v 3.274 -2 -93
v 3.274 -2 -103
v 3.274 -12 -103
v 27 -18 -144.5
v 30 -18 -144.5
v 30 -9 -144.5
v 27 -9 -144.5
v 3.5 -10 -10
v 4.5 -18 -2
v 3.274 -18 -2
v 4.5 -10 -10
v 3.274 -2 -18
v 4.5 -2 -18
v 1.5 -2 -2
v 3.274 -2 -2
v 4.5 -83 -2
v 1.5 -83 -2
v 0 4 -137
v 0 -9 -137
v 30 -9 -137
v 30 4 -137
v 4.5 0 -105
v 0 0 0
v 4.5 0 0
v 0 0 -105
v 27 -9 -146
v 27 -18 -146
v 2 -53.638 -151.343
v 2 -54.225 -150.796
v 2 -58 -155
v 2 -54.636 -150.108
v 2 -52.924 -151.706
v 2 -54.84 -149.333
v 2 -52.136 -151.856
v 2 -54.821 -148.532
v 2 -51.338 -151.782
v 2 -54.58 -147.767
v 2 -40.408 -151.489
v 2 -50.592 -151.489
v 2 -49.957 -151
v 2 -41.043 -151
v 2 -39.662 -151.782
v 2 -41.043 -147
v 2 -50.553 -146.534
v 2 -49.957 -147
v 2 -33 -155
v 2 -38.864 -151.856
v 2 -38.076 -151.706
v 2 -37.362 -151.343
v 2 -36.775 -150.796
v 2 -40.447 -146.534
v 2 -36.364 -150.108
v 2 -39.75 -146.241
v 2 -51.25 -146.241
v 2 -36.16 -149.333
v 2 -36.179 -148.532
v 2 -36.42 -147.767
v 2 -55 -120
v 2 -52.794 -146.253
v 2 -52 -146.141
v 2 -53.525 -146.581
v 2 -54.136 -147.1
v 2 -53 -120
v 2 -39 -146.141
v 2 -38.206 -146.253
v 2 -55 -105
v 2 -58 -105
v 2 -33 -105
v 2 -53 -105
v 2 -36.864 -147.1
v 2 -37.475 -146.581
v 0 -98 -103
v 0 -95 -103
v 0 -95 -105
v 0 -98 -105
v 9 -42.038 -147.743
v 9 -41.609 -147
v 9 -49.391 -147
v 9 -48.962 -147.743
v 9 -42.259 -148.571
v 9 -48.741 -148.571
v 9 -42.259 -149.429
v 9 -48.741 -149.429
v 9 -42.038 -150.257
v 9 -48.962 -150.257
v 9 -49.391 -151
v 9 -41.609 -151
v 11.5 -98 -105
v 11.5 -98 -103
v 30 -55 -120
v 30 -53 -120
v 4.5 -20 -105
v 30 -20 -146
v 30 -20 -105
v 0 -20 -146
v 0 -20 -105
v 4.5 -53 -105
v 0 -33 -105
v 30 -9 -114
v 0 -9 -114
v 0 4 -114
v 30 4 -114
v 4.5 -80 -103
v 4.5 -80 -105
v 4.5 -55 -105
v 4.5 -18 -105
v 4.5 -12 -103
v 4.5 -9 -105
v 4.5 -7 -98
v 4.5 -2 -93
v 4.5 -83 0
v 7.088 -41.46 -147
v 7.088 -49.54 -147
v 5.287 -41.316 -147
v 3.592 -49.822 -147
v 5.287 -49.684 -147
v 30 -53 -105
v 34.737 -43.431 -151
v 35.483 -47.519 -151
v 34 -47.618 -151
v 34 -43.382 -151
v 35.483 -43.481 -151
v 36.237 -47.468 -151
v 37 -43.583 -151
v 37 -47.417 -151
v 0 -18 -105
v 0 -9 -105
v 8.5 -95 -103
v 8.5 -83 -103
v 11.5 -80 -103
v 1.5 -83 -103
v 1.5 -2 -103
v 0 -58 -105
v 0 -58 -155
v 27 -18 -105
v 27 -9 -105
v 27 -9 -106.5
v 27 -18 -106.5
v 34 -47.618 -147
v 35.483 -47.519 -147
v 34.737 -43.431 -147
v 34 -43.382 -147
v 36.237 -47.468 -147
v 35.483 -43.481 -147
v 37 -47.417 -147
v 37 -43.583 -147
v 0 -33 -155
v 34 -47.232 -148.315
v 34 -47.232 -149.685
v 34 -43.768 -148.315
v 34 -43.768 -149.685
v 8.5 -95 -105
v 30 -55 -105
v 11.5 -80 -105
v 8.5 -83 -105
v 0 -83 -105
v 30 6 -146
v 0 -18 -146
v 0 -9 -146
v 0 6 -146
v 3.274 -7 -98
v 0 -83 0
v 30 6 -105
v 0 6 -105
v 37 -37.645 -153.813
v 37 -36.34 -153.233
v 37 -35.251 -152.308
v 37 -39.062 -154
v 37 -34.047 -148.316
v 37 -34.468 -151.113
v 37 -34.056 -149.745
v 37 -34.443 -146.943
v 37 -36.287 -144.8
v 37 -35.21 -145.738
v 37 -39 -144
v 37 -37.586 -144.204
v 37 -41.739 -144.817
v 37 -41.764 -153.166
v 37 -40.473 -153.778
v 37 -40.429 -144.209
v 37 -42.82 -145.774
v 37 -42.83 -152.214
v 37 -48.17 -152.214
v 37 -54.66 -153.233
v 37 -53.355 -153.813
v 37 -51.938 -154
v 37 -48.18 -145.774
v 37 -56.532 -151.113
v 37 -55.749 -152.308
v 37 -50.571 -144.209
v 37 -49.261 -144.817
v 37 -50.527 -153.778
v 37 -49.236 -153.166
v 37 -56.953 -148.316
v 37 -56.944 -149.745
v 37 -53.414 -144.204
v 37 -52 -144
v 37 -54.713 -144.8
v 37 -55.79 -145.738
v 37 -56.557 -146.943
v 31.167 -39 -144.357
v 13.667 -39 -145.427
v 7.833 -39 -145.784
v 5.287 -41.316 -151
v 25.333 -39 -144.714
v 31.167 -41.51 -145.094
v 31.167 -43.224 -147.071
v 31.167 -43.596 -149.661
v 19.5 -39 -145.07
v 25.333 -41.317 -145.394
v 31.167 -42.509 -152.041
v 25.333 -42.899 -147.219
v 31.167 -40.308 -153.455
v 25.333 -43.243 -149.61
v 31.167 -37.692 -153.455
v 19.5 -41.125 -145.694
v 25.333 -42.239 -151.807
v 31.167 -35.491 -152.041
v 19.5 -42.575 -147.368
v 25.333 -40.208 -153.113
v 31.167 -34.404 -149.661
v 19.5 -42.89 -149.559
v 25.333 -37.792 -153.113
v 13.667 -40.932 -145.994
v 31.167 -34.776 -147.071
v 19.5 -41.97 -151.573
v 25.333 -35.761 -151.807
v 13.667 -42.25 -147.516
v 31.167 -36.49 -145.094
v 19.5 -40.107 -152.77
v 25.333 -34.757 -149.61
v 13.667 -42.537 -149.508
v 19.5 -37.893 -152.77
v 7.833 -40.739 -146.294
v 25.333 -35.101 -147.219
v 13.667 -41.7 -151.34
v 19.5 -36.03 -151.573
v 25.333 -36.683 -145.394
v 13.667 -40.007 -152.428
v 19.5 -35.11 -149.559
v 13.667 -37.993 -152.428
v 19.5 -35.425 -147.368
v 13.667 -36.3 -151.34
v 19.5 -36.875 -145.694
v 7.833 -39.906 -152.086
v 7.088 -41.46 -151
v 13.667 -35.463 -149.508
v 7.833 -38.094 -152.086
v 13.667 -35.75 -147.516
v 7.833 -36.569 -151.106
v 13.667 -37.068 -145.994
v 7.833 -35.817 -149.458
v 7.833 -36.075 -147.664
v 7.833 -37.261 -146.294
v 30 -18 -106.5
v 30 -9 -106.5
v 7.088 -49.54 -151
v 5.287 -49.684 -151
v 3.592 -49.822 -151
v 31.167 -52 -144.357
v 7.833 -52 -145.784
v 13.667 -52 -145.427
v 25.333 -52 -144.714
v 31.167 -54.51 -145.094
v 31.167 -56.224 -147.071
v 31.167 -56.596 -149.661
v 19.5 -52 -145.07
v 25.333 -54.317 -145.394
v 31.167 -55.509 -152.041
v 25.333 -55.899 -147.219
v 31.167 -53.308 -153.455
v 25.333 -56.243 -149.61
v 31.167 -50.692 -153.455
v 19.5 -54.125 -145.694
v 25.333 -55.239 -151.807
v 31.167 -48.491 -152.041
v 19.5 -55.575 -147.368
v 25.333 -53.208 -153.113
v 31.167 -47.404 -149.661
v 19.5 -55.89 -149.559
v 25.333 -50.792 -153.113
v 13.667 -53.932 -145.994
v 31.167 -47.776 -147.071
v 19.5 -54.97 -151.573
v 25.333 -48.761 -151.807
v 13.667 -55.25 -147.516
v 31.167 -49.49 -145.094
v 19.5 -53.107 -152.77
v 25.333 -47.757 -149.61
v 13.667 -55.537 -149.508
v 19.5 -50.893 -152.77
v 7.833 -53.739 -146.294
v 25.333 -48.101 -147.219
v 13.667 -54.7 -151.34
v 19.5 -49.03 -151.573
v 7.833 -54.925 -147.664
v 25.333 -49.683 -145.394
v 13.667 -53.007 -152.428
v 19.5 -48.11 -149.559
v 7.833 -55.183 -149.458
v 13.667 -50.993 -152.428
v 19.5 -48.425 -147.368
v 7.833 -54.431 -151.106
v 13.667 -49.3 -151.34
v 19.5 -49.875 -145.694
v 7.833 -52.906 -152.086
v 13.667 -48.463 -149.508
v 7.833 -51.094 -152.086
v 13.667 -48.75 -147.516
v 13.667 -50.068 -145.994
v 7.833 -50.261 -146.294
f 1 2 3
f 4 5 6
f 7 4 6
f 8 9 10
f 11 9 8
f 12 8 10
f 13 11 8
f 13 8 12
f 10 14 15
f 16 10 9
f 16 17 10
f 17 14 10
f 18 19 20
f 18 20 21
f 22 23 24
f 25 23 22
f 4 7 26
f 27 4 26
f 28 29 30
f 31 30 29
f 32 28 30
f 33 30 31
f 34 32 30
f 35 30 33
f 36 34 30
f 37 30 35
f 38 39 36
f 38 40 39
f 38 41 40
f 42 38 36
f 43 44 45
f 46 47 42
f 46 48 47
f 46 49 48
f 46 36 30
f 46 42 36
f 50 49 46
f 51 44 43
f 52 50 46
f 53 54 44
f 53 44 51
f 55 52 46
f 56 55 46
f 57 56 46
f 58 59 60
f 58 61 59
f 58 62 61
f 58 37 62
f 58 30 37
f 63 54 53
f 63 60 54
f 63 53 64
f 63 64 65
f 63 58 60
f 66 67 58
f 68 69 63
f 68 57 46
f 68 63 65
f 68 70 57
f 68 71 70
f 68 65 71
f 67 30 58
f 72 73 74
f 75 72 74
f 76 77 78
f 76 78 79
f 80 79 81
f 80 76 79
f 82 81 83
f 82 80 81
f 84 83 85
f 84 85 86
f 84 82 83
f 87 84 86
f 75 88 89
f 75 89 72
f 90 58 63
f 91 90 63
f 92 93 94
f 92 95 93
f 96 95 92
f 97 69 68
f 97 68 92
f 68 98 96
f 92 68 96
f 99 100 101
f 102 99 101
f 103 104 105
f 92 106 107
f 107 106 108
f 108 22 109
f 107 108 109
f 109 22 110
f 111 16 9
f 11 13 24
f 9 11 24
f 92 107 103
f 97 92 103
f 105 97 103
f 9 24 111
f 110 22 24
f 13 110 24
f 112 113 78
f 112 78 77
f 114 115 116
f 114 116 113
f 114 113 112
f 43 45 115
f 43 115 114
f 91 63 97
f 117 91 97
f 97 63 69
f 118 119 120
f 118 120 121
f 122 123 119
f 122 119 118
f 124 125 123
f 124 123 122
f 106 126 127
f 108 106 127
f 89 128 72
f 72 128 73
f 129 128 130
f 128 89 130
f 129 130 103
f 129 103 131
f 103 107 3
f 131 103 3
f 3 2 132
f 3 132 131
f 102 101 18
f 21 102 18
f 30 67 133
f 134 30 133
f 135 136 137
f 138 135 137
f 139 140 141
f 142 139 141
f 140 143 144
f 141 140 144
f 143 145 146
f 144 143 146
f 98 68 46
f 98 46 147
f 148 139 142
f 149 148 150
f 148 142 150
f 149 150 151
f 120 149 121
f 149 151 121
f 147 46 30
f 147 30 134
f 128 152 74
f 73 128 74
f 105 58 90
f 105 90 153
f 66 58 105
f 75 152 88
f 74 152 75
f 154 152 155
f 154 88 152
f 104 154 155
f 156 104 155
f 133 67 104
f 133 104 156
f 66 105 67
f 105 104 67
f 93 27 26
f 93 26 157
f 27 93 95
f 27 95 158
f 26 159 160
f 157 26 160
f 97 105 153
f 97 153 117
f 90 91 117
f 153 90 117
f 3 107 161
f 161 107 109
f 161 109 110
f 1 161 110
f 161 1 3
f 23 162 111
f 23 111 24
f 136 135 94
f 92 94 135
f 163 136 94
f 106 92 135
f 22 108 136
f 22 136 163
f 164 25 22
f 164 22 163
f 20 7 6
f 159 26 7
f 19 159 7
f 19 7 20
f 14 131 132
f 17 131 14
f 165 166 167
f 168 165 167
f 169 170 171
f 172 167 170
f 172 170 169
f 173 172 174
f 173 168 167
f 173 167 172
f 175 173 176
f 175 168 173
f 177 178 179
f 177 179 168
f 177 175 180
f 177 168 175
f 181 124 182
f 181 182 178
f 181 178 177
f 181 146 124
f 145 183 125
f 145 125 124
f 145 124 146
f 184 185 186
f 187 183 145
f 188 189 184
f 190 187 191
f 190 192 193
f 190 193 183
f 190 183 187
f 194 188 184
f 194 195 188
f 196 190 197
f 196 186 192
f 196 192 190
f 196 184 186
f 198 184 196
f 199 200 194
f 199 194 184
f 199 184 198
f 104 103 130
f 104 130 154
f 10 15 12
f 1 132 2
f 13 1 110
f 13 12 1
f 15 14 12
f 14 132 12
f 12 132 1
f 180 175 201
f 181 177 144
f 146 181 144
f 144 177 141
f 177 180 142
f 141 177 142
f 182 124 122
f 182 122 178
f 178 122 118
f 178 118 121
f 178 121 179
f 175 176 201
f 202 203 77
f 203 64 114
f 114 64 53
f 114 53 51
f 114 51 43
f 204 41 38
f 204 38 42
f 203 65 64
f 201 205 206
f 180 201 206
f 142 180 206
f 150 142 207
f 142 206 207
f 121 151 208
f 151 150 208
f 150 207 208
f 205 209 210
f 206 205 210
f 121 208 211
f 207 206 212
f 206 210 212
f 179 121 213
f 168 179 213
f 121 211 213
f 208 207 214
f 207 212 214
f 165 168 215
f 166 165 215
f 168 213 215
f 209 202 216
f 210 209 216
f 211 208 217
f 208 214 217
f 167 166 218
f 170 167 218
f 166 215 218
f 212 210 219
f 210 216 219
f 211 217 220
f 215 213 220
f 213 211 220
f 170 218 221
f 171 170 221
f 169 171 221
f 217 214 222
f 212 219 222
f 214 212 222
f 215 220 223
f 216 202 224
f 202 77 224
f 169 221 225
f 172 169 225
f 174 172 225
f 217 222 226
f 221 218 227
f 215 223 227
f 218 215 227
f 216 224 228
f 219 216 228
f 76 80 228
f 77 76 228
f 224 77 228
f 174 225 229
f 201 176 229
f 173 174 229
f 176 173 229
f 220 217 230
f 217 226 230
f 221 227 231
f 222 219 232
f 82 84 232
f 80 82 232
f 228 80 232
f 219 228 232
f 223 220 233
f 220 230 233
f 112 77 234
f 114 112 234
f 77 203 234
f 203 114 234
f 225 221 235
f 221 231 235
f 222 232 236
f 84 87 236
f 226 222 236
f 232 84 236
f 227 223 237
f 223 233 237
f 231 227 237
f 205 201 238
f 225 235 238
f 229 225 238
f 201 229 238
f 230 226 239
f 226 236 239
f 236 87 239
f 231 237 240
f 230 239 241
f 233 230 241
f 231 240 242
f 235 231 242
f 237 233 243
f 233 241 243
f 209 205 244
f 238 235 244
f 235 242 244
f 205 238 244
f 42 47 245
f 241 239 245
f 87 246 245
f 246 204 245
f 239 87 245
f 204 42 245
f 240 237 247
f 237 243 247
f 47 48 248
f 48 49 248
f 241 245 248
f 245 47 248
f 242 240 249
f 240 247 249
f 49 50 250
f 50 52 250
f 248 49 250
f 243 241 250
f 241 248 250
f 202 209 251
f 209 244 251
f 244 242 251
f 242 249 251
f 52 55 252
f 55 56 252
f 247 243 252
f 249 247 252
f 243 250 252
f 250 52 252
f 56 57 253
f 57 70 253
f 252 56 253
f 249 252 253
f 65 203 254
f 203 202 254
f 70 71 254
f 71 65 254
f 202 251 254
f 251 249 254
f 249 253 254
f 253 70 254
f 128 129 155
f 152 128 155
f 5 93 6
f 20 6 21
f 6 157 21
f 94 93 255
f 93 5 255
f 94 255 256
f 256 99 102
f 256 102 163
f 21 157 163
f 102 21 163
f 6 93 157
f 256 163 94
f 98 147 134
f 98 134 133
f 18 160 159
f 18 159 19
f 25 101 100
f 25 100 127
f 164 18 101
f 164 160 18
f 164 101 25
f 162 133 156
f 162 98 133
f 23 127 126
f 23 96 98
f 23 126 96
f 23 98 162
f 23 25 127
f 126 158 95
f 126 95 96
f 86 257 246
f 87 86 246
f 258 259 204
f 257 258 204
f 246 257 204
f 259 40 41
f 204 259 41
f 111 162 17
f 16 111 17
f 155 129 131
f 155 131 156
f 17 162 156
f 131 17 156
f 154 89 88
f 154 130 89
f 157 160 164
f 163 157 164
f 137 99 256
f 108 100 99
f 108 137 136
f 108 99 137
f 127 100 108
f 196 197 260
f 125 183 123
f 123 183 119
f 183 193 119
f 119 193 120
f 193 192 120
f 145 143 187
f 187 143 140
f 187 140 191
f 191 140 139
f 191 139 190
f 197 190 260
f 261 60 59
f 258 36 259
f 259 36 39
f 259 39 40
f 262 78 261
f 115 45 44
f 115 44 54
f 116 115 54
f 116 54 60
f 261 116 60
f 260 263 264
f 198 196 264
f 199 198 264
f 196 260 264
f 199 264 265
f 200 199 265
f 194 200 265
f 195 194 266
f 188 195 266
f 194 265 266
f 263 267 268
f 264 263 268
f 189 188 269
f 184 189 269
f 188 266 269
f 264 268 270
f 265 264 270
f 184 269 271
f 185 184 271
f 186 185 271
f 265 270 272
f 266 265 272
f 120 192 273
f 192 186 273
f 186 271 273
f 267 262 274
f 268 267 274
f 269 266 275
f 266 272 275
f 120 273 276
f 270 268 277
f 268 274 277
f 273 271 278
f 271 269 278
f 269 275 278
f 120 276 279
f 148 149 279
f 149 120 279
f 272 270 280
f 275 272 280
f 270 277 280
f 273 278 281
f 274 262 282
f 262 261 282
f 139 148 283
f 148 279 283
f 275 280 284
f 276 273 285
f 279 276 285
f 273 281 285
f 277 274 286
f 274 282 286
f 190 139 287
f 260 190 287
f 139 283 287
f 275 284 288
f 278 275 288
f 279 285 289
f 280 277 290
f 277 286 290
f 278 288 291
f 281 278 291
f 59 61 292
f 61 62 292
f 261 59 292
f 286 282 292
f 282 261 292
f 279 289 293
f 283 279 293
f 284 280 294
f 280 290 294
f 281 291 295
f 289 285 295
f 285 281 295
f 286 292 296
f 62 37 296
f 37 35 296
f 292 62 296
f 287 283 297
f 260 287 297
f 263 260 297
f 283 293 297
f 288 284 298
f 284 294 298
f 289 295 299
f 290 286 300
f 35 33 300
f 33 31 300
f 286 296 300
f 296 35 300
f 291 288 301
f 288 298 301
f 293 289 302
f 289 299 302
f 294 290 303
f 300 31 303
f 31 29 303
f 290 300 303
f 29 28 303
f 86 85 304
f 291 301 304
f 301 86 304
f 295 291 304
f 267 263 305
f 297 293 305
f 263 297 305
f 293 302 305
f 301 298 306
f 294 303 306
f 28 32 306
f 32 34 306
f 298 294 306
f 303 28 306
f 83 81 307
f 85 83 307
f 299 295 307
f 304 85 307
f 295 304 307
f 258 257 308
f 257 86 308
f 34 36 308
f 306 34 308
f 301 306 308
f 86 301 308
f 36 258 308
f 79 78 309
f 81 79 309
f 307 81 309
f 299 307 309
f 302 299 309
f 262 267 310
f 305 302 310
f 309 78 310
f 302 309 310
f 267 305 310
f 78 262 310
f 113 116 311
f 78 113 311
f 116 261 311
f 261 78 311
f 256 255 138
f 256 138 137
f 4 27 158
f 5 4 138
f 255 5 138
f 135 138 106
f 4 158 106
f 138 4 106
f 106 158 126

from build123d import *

# Parameters (mm, degrees)
SKETCH6_W            = 105
SKETCH6_H            = 83
BOSS_EXTRUDE3_DEPTH  = 4.5
SKETCH9_W            = 3
SKETCH9_H            = 101
CUT_EXTRUDE6_DEPTH   = 81
SKETCH10_W           = 1
SKETCH10_H           = 8
BOSS_EXTRUDE4_DEPTH  = 8
SKETCH11_W           = 1.226225524
SKETCH11_H           = 5
BOSS_EXTRUDE5_DEPTH  = 5
BOSS_EXTRUDE12_DEPTH = 1.226226
SKETCH27_W           = 15
SKETCH27_H           = 2
SKETCH27_W_2         = 41
SKETCH27_W_3         = 9
SKETCH27_H_2         = 15
BOSS_EXTRUDE20_DEPTH = 30
SKETCH28_W           = 1.5
SKETCH28_H           = 11
BOSS_EXTRUDE21_DEPTH = 3
SKETCH29_W           = 41
SKETCH29_H           = 2
BOSS_EXTRUDE22_DEPTH = 30
SKETCH30_W           = 2
SKETCH30_H           = 25
BOSS_EXTRUDE23_DEPTH = 50
SKETCH31_R           = 5
BOSS_EXTRUDE24_DEPTH = 35
DRAFT1_ANGLE         = -3.5
DRAFT3_ANGLE         = -3.5
SKETCH32_W           = 4
SKETCH32_H           = 15
BOSS_EXTRUDE25_DEPTH = 7
SKETCH33_W           = 4
SKETCH33_H           = 13
BOSS_EXTRUDE26_DEPTH = 3
SKETCH34_W           = 2
SKETCH34_H           = 3
BOSS_EXTRUDE27_DEPTH = 4
SKETCH35_W           = 2
SKETCH35_H           = 15
BOSS_EXTRUDE28_DEPTH = 3
SKETCH36_W           = 11.5
SKETCH36_H           = 2
BOSS_EXTRUDE29_DEPTH = 3


with BuildPart() as part:
    # Sketch6 → Boss-Extrude3 (new body)
    with BuildSketch(Plane(origin=(0, 0, 0), x_dir=(0, 0, -1), z_dir=(1, 0, 0))):
        with Locations((52.5, -41.5)):
            Rectangle(SKETCH6_W, SKETCH6_H)
    extrude(amount=BOSS_EXTRUDE3_DEPTH)

    # Sketch9 → Cut-Extrude6 (cut)
    with BuildSketch(Plane.XZ.offset(83)):
        with Locations((3, -52.5)):
            Rectangle(SKETCH9_W, SKETCH9_H)
    extrude(amount=-CUT_EXTRUDE6_DEPTH, mode=Mode.SUBTRACT)

    # Sketch10 → Boss-Extrude4 (add)
    with BuildSketch(Plane(origin=(0, 0, -2), x_dir=(-1, 0, 0), z_dir=(0, 0, -1))):
        with Locations((-4, -6)):
            Rectangle(SKETCH10_W, SKETCH10_H)
    extrude(amount=BOSS_EXTRUDE4_DEPTH)

    # Sketch11 → Boss-Extrude5 (add)
    with BuildSketch(Plane.XY.offset(-103)):
        with Locations((3.886887238, -4.5)):
            Rectangle(SKETCH11_W, SKETCH11_H)
    extrude(amount=BOSS_EXTRUDE5_DEPTH)

    # Sketch18 → Boss-Extrude12 (add)
    with BuildSketch(Plane(origin=(4.5, 0, 0), x_dir=(0, 0, -1), z_dir=(1, 0, 0))):
        Polygon((103, -12), (93, -2), (103, -2), align=None)
        Polygon((18, -2), (2, -2), (2, -18), align=None)
    extrude(amount=-BOSS_EXTRUDE12_DEPTH)

    # Sketch27 → Boss-Extrude20 (add)
    with BuildSketch(Plane.ZY):
        with Locations((-112.5, -54)):
            Rectangle(SKETCH27_W, SKETCH27_H)
        with Locations((-125.5, -19)):
            Rectangle(SKETCH27_W_2, SKETCH27_H)
        with Locations((-109.5, -1.5)):
            Rectangle(SKETCH27_W_3, SKETCH27_H_2)
        with Locations((-141.5, -1.5)):
            Rectangle(SKETCH27_W_3, SKETCH27_H_2)
    extrude(amount=-BOSS_EXTRUDE20_DEPTH)


with BuildPart() as boss_extrude20_piece_1:
    # of the separate pieces the step leaves, piece 1, a body of its own (boss_extrude20_pieces)
    add(part.part.solids().sort_by_distance((0, 0, 0))[0])



with BuildPart() as boss_extrude20_piece_2:
    # of the separate pieces the step leaves, piece 2, a body of its own (boss_extrude20_pieces)
    add(part.part.solids().sort_by_distance((0, 6, -146))[0])


with BuildPart() as boss_extrude20_piece_1_1:
    add(boss_extrude20_piece_1.part)

    add(boss_extrude20_piece_2.part)  # Boss-Extrude21 merges Boss-Extrude20 piece 2
    # Sketch28 → Boss-Extrude21 (add)
    with BuildSketch(Plane(origin=(30, 0, 0), x_dir=(0, 0, -1), z_dir=(1, 0, 0))):
        with Locations((145.25, -14.5)):
            Rectangle(SKETCH28_W, SKETCH28_H)
        with Locations((105.75, -14.5)):
            Rectangle(SKETCH28_W, SKETCH28_H)
    extrude(amount=-BOSS_EXTRUDE21_DEPTH)

    # Sketch29 → Boss-Extrude22 (add)
    with BuildSketch(Plane(origin=(30, 0, 0), x_dir=(0, 0, -1), z_dir=(1, 0, 0))):
        with Locations((125.5, 5)):
            Rectangle(SKETCH29_W, SKETCH29_H)
    extrude(amount=-BOSS_EXTRUDE22_DEPTH)

    # Sketch30 → Boss-Extrude23 (add)
    with BuildSketch(Plane(origin=(0, 0, -105), x_dir=(-1, 0, 0), z_dir=(0, 0, -1))):
        with Locations((-1, -45.5)):
            Rectangle(SKETCH30_W, SKETCH30_H)
    extrude(amount=BOSS_EXTRUDE23_DEPTH)

    # Sketch31 → Boss-Extrude24 (add)
    with BuildSketch(Plane(origin=(2, 0, 0), x_dir=(0, 0, -1), z_dir=(1, 0, 0))):
        with Locations(Location((149, -52, 0), (0, 0, 180))):
            Circle(SKETCH31_R)
        with Locations(Location((149, -39, 0), (0, 0, 180))):
            Circle(SKETCH31_R)
    extrude(amount=BOSS_EXTRUDE24_DEPTH)

    # Draft1
    draft1_faces = [boss_extrude20_piece_1_1.faces().sort_by_distance(p)[0] for p in [
        (19.5, -52, -154),
    ]]
    draft(draft1_faces, Plane(origin=(37, -52, -149), x_dir=(0, 0, 1), z_dir=(1, 0, 0)), DRAFT1_ANGLE)

    # Draft3
    draft3_faces = [boss_extrude20_piece_1_1.faces().sort_by_distance(p)[0] for p in [
        (19.5, -39, -154),
    ]]
    draft(draft3_faces, Plane(origin=(37, -39, -149), x_dir=(0, 0, 1), z_dir=(1, 0, 0)), DRAFT3_ANGLE)

    # Sketch32 → Boss-Extrude25 (add)
    with BuildSketch(Plane(origin=(2, 0, 0), x_dir=(0, 0, -1), z_dir=(1, 0, 0))):
        with Locations((149, -45.5)):
            Rectangle(SKETCH32_W, SKETCH32_H)
    extrude(amount=BOSS_EXTRUDE25_DEPTH)

    # Sketch33 → Boss-Extrude26 (add)
    with BuildSketch(Plane(origin=(37, 0, 0), x_dir=(0, 0, -1), z_dir=(1, 0, 0))):
        with Locations((149, -45.5)):
            Rectangle(SKETCH33_W, SKETCH33_H)
    extrude(amount=-BOSS_EXTRUDE26_DEPTH)

    # Sketch34 → Boss-Extrude27 (add)
    with BuildSketch(Plane(origin=(4.5, 0, 0), x_dir=(0, 0, -1), z_dir=(1, 0, 0))):
        with Locations((104, -81.5)):
            Rectangle(SKETCH34_W, SKETCH34_H)
    extrude(amount=BOSS_EXTRUDE27_DEPTH)

    # Sketch35 → Boss-Extrude28 (add)
    with BuildSketch(Plane(origin=(8.5, 0, 0), x_dir=(0, 0, -1), z_dir=(1, 0, 0))):
        with Locations((104, -87.5)):
            Rectangle(SKETCH35_W, SKETCH35_H)
    extrude(amount=BOSS_EXTRUDE28_DEPTH)

    # Sketch36 → Boss-Extrude29 (add)
    with BuildSketch(Plane(origin=(0, -95, 0), x_dir=(-1, 0, 0), z_dir=(0, -1, 0))):
        with Locations((-5.75, 104)):
            Rectangle(SKETCH36_W, SKETCH36_H)
    extrude(amount=BOSS_EXTRUDE29_DEPTH)


solid = boss_extrude20_piece_1_1.part
